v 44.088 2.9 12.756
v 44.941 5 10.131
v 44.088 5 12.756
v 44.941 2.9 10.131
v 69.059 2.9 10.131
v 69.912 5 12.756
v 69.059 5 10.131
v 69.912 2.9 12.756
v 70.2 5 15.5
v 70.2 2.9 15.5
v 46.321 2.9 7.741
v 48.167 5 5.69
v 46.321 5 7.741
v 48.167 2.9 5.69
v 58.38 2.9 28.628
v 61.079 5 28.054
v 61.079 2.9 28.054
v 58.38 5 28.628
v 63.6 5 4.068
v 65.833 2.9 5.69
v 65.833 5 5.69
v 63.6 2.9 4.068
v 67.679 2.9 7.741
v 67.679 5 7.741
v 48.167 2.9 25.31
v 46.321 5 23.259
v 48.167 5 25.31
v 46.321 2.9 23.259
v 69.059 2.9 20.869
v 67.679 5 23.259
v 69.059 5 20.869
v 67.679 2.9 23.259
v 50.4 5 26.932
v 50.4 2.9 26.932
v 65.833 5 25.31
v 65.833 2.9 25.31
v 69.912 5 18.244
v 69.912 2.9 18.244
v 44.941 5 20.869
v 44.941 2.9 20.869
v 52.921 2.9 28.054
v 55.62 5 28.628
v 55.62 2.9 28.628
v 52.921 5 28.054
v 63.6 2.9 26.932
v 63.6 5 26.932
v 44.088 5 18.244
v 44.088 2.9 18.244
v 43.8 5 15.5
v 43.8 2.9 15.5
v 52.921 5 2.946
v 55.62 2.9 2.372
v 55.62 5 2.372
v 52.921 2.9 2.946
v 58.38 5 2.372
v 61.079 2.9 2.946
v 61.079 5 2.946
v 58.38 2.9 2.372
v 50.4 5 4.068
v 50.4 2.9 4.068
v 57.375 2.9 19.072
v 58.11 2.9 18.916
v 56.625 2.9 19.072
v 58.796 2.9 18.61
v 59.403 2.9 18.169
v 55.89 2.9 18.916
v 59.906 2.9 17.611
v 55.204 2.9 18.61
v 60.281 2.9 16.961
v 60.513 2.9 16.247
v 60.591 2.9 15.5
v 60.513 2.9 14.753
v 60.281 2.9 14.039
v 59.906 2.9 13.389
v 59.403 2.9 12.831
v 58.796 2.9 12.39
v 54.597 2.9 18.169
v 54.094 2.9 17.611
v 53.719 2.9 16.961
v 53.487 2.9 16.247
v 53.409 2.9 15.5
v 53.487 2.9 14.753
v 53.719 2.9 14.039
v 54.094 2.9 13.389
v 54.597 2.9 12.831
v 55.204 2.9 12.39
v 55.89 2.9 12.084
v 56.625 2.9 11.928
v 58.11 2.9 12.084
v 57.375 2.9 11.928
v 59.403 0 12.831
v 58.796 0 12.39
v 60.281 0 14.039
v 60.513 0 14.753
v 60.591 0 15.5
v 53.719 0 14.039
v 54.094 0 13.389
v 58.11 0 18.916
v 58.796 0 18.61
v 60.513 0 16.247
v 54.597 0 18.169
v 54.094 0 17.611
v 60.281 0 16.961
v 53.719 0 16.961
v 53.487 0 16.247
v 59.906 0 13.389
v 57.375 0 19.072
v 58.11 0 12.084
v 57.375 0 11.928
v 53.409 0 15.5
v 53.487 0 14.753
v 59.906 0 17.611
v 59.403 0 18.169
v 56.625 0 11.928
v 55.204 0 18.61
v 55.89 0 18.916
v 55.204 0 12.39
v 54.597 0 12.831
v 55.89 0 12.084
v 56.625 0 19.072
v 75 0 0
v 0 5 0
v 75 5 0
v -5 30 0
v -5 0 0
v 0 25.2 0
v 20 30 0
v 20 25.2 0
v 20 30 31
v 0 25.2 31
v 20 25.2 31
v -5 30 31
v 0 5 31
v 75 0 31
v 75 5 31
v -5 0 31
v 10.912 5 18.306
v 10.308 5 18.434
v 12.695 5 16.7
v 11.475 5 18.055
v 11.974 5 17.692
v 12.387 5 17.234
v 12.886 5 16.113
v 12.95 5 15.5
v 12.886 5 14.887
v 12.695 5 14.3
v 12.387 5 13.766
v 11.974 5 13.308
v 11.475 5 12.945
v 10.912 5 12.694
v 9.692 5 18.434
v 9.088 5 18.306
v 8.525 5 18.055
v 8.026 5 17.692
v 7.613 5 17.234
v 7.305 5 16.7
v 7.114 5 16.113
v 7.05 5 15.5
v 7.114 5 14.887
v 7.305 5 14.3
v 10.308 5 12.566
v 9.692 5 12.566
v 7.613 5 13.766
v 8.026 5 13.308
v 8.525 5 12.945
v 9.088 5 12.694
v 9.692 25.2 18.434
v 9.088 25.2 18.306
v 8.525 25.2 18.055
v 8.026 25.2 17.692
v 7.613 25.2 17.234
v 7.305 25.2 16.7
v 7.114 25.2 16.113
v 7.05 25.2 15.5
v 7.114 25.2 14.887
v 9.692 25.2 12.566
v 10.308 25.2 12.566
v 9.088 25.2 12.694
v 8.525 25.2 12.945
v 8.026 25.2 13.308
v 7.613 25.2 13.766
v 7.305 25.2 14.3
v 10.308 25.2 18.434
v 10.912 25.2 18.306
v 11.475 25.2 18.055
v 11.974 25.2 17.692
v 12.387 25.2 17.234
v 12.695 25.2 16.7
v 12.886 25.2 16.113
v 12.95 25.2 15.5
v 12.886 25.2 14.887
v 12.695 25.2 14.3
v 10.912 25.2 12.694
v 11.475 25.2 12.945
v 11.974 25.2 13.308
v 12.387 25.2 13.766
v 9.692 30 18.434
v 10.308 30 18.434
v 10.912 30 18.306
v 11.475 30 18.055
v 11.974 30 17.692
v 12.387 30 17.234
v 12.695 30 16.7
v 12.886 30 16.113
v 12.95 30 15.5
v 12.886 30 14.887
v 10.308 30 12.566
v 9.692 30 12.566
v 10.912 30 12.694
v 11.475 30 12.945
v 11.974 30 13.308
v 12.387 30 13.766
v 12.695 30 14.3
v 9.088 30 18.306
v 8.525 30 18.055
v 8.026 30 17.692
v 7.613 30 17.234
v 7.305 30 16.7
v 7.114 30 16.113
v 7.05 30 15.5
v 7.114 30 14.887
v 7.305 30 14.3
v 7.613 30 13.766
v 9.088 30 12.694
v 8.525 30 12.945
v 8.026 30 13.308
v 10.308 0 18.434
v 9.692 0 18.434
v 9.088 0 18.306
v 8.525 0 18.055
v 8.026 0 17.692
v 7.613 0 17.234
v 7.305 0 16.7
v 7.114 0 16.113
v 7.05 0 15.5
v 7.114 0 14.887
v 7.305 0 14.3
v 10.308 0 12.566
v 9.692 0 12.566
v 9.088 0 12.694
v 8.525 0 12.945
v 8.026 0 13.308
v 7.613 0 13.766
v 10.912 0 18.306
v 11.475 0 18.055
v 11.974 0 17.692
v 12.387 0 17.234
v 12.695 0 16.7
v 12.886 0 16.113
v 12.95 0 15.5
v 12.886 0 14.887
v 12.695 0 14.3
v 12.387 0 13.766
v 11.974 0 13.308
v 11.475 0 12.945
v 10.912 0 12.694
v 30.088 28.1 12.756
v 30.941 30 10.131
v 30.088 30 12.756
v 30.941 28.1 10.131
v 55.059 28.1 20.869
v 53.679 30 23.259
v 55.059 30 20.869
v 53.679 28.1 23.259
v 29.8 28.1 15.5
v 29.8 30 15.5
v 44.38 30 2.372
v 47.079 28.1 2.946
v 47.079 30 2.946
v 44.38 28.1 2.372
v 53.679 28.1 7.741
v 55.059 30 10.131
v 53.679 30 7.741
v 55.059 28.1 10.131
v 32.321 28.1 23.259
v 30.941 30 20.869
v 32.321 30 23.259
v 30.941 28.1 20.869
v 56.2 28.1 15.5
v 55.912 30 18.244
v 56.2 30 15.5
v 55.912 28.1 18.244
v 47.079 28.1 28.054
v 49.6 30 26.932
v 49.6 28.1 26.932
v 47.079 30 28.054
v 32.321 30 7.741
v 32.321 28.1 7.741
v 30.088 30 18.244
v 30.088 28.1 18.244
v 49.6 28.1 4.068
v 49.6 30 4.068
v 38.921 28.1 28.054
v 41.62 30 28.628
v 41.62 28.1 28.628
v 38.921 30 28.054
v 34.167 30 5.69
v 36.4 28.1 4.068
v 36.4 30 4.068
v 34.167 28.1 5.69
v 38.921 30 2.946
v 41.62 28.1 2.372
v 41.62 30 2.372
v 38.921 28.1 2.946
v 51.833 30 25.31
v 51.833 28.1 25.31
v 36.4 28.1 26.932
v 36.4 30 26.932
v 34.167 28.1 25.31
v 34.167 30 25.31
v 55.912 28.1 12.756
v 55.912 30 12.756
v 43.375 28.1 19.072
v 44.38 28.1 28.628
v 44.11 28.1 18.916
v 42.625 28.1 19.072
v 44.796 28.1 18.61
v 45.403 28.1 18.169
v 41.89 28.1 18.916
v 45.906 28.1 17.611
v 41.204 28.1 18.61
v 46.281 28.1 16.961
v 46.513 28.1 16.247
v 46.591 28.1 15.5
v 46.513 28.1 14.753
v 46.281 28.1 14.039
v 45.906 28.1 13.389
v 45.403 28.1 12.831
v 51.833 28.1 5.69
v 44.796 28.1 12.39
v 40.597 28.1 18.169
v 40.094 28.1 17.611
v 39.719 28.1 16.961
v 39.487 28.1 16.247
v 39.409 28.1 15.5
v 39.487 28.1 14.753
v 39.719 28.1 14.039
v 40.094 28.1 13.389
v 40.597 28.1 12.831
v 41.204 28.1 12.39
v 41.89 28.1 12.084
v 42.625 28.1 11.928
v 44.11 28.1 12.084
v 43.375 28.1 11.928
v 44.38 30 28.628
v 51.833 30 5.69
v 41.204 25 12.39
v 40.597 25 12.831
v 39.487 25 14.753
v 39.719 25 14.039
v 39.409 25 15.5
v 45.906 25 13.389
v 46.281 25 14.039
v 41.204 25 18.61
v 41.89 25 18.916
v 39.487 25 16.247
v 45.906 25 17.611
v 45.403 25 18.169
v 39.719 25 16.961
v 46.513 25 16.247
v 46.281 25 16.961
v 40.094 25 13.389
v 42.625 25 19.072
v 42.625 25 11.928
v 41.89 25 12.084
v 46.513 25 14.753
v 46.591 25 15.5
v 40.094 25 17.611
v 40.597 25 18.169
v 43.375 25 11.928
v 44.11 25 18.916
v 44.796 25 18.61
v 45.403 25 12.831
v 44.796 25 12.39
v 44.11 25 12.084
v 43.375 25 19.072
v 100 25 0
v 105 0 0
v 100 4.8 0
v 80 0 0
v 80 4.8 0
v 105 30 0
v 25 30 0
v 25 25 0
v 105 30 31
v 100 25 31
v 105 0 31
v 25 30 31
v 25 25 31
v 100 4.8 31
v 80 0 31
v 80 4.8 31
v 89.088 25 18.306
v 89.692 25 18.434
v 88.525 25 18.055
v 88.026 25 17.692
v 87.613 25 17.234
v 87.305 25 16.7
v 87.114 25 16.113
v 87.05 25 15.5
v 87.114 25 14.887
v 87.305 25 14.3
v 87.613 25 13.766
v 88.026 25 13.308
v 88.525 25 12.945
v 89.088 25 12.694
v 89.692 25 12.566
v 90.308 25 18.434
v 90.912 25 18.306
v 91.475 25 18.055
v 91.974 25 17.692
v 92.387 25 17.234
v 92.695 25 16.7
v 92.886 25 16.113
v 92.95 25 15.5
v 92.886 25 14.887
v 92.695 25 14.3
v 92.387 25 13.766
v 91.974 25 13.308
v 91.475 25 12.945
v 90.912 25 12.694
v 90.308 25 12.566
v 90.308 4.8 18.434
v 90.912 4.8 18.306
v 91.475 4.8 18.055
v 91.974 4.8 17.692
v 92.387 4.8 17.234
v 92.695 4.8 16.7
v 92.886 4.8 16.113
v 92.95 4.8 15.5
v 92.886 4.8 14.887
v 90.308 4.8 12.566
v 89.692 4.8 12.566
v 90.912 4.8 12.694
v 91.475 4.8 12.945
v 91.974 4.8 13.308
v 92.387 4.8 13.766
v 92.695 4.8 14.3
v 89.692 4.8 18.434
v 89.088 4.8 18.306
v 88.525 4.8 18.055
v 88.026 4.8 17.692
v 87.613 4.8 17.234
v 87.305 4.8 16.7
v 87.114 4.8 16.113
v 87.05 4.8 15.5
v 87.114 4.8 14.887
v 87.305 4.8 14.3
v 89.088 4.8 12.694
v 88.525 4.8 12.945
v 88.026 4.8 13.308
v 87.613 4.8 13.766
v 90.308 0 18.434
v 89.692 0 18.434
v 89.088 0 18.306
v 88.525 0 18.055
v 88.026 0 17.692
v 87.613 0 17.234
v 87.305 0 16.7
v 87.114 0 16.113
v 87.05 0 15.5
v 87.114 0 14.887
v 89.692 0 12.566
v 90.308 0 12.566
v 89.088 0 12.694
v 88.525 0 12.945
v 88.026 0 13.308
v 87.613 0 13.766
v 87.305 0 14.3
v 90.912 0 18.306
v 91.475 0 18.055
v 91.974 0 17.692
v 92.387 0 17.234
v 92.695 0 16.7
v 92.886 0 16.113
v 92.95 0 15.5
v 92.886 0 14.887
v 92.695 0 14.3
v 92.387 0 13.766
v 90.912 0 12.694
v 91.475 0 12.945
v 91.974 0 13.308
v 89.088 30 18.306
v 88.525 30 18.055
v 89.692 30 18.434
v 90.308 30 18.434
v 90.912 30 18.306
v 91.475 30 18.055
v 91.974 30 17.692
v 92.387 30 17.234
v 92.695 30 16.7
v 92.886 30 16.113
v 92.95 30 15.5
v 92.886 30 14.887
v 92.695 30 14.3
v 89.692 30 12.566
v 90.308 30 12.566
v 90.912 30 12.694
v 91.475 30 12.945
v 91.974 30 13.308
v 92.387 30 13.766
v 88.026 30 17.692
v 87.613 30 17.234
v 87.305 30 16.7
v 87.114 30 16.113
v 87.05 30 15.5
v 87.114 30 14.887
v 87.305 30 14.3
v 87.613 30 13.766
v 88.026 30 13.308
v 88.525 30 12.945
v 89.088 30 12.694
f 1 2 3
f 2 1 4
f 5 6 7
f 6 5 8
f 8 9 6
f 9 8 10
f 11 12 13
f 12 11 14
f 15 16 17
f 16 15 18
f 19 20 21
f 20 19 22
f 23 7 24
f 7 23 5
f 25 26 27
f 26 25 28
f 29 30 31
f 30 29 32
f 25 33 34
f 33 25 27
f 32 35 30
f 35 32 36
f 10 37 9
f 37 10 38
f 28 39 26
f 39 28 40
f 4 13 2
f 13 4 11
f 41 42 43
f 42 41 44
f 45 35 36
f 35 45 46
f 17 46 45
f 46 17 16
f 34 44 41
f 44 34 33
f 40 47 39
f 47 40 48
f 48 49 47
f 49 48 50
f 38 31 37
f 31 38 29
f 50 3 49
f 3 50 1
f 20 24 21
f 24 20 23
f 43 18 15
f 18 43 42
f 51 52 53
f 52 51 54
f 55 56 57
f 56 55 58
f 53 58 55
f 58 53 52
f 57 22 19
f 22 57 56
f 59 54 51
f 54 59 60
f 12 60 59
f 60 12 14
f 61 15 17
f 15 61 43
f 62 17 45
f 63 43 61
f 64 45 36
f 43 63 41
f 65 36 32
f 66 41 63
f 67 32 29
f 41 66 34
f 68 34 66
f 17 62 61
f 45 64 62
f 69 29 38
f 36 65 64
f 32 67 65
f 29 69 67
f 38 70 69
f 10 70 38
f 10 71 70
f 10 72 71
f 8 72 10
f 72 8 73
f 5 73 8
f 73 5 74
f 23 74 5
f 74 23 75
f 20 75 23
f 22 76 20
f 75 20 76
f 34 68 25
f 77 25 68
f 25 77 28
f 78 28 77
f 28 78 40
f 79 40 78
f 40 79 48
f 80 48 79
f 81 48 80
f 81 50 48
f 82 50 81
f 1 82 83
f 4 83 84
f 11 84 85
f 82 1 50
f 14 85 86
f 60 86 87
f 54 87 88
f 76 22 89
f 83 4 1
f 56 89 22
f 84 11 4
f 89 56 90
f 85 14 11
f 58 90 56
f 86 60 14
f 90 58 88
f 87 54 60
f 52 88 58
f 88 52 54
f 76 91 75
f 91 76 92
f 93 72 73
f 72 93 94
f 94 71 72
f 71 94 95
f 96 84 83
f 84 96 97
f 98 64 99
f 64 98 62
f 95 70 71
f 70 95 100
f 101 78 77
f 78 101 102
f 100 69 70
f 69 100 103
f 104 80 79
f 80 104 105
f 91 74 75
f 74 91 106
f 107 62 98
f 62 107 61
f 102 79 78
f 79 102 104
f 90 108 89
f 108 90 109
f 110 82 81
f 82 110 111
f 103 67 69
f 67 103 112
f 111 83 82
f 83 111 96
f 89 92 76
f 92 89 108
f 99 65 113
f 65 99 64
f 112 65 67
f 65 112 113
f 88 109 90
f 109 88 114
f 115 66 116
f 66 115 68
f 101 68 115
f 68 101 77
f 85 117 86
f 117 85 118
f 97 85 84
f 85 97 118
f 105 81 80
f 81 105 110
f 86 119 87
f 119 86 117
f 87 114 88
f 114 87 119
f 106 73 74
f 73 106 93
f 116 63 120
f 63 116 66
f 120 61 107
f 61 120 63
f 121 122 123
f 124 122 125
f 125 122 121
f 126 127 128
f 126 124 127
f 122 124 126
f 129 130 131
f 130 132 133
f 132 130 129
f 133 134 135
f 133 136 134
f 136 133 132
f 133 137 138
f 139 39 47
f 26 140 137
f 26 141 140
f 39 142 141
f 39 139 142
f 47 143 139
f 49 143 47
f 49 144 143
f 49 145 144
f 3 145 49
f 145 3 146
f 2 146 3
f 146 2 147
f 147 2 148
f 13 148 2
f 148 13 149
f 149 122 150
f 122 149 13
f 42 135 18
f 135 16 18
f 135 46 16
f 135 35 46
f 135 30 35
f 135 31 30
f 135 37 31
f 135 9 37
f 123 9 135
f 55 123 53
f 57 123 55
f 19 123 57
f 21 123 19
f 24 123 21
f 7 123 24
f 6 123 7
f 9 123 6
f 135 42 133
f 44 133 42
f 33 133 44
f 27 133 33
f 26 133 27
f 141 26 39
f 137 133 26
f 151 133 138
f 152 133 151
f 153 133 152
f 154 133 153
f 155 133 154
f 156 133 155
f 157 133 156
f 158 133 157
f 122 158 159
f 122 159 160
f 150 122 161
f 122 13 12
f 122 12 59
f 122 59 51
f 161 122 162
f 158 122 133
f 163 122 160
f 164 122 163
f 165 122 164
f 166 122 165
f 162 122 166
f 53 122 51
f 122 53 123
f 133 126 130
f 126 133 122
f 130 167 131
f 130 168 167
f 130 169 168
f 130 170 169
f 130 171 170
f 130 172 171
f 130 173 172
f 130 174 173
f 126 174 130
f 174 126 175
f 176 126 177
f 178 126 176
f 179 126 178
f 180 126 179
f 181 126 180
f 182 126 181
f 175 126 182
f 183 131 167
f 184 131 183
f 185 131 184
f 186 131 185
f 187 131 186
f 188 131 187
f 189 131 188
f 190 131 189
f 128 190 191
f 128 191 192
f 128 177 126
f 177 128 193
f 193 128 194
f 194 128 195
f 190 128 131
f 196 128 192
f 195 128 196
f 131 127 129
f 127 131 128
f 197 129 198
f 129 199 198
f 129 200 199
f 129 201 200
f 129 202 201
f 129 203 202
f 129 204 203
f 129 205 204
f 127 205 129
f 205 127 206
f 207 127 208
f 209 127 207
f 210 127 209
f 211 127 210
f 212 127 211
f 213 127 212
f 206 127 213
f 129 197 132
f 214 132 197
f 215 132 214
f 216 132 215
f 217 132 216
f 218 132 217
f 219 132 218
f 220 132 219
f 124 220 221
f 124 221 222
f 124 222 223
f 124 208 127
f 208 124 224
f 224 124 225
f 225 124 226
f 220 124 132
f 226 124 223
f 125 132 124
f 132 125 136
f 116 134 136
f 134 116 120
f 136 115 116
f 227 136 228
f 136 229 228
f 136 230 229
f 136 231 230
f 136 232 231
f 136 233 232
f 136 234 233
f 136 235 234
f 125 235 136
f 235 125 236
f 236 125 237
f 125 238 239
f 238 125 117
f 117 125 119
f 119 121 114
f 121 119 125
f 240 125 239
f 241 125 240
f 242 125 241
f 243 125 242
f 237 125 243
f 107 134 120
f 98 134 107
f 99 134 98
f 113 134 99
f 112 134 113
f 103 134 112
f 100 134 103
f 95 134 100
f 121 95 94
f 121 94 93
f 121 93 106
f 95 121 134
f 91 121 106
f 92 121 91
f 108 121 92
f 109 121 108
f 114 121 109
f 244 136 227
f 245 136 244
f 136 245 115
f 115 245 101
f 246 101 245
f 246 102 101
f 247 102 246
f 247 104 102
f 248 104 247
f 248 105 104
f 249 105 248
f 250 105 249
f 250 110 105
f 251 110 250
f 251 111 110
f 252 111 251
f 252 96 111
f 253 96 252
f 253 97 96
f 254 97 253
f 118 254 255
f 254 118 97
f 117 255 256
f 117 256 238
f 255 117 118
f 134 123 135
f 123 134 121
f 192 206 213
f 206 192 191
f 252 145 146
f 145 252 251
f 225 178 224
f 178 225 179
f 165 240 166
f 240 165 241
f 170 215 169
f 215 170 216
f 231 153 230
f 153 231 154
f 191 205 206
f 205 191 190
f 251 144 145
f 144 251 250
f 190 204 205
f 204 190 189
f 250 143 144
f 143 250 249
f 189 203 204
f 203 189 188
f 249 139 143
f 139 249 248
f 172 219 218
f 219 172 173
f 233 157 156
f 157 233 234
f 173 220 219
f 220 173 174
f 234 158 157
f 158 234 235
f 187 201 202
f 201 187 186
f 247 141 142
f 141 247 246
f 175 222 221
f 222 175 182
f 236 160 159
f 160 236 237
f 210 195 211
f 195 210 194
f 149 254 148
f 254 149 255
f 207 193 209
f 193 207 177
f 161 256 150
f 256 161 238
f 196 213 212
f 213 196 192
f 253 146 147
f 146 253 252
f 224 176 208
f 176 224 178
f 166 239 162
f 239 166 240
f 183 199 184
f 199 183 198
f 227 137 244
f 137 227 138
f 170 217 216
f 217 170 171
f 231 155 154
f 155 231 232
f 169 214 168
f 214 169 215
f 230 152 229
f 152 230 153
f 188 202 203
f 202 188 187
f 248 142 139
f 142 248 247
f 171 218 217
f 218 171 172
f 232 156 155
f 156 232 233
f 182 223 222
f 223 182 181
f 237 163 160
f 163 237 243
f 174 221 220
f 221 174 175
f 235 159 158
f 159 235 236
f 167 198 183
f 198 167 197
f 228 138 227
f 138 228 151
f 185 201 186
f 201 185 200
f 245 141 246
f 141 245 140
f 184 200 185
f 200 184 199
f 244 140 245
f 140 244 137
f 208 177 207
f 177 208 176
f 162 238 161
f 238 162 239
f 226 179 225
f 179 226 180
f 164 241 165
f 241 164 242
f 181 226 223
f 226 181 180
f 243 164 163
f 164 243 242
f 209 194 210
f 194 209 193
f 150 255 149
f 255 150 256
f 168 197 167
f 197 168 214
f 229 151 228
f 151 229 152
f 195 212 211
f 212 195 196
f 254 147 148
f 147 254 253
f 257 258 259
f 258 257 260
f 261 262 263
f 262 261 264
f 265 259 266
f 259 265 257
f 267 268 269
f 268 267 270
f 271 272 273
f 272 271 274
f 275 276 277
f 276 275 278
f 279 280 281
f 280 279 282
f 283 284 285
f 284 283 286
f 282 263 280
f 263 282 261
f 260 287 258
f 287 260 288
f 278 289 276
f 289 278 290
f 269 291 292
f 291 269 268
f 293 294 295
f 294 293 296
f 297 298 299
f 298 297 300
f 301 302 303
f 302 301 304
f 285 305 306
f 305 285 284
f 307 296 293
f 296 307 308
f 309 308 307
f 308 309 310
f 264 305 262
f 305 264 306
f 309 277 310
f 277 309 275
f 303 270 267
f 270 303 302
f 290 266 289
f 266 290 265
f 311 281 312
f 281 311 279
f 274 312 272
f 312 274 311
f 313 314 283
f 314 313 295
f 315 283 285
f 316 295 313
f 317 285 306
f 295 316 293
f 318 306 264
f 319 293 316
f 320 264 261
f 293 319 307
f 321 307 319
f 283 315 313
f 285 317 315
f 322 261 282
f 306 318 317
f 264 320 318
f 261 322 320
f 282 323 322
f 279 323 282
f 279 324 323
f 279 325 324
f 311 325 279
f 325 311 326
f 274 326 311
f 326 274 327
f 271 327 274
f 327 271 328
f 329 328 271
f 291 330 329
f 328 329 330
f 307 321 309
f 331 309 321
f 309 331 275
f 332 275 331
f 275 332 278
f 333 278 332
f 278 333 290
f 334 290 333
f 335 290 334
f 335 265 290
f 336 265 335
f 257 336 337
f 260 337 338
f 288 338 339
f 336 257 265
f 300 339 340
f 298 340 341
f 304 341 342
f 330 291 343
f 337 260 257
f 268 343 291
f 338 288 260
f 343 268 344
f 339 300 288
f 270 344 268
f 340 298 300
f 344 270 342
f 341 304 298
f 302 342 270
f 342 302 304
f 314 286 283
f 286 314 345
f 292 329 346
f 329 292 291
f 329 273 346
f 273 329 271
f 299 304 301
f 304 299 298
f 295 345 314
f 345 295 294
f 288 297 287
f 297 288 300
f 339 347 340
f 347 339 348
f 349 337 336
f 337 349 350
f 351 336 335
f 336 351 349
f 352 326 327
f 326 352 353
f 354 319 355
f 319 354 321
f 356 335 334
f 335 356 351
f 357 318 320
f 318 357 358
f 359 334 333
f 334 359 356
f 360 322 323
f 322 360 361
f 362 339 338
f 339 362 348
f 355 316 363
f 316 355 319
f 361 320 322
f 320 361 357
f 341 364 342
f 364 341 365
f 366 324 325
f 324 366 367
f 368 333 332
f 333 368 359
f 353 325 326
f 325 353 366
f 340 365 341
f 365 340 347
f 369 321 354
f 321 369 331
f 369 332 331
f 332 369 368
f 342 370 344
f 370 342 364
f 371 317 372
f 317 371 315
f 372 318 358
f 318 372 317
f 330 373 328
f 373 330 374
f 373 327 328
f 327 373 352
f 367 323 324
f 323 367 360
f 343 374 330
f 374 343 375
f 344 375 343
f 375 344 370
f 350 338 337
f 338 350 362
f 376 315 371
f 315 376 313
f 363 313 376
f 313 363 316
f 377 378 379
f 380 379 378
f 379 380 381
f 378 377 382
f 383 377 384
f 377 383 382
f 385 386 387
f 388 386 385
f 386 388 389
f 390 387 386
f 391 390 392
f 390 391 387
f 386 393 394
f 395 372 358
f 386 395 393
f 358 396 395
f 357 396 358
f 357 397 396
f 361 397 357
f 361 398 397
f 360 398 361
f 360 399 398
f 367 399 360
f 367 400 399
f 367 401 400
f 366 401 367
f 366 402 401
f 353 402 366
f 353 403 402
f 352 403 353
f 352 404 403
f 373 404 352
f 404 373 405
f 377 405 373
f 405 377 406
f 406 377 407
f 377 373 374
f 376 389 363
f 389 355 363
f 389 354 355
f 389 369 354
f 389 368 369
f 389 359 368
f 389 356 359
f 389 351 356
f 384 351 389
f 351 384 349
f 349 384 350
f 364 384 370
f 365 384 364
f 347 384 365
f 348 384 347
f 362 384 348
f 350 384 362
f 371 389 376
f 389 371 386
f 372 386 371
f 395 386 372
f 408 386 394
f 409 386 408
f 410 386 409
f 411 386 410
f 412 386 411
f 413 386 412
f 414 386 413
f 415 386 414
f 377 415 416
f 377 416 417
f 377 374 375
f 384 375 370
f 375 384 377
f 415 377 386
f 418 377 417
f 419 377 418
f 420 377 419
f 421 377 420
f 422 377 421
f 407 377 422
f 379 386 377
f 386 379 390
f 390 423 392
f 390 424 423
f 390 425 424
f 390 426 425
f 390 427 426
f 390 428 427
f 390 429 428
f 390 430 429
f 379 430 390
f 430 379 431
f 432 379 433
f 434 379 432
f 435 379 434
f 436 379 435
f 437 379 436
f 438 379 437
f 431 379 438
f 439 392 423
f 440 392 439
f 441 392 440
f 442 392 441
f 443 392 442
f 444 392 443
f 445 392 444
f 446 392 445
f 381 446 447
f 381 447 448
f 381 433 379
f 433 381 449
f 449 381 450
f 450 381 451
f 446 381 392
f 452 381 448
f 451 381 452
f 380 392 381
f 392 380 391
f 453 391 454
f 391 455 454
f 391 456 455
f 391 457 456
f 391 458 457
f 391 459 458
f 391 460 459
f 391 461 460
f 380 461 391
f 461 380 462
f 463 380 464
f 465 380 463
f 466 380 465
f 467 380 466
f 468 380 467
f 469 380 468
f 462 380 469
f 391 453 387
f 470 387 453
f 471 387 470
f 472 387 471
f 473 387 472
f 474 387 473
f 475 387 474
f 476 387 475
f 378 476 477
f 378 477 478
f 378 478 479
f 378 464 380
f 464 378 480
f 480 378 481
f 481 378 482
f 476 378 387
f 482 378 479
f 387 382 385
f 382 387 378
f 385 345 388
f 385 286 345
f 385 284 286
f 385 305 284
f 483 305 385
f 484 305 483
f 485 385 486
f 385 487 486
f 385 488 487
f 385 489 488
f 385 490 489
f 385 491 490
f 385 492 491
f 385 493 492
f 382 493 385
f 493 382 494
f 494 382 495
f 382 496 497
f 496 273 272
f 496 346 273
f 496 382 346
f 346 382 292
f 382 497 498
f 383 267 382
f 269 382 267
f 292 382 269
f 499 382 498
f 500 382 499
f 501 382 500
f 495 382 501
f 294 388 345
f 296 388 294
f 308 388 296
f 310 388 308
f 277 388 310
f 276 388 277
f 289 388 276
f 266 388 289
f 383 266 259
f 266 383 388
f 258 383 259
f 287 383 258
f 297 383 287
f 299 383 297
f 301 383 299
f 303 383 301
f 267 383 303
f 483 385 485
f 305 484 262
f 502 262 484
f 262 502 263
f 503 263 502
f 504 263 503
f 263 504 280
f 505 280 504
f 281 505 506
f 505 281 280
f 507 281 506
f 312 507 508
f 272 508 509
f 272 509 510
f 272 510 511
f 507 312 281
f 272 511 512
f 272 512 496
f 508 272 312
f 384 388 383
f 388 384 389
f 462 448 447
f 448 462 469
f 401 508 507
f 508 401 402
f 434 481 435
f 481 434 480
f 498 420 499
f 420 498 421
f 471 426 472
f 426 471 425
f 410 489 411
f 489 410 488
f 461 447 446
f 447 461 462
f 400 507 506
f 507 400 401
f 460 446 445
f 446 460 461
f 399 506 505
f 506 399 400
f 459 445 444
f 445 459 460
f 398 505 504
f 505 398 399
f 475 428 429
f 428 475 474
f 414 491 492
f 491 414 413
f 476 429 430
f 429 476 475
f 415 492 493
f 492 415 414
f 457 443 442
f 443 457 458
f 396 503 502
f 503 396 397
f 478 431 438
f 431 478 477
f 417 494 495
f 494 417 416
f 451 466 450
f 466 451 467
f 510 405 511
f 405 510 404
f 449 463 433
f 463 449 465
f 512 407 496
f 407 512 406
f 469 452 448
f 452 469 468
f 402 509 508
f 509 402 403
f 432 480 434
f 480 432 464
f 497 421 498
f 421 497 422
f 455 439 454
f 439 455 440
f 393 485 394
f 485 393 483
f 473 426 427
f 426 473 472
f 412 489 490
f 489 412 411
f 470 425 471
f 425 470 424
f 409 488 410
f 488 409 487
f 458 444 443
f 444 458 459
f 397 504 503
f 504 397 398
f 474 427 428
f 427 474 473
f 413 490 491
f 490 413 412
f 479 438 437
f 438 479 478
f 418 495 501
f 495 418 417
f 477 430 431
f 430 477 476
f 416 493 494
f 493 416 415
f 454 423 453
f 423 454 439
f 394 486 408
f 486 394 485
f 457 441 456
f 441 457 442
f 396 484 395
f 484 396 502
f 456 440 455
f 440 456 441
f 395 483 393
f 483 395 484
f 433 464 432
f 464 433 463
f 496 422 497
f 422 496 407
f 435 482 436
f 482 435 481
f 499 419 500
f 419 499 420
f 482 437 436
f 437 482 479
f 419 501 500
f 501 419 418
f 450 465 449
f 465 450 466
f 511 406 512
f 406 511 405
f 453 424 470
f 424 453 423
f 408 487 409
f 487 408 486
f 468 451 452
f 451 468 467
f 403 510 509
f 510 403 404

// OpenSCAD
// Bracket to connect A/V equipment (like a light) to 2020 extrusion
// Adrian McCarthy 21-09-2023

function thou(x) = 25.5 * x/1000;

module av_bracket(washer_inside=true, nozzle_d=0.4) {
    th = 5;
    extrusion_size = 20;
    washer_d = 26;
    washer_recess = 2;
    washer_z = washer_inside ? th-washer_recess : washer_recess-th;
    reach = 50;
    bracket_l = th + reach + extrusion_size + th;
    bracket_w = th + extrusion_size + th;
    bracket_h = max(extrusion_size, washer_d) + th;
    $fs = nozzle_d/2;

    translate([0, 0, bracket_h/2]) rotate([-90, 0, 0]) {
        difference() {
            translate([0, 0, th]) rotate([90, 0, 0]) {
                linear_extrude(bracket_h, convexity=10, center=true) {
                    translate([-th, -th]) {
                        square([bracket_l, th]);
                        square([th, bracket_w]);
                    }
                    translate([-th, extrusion_size+nozzle_d/2]) {
                        square([th + extrusion_size, th - nozzle_d/2]);
                    }
                }
            }
            
            translate([extrusion_size + reach - washer_d/2, 0, -0.1]) {
                translate([0, 0, washer_z]) {
                    linear_extrude(th) {
                        circle(d=washer_d+nozzle_d);
                    }
                }
                translate([0, 0, -1]) linear_extrude(th+2) {
                    circle(d=thou(266)+nozzle_d);
                }
            }
            translate([extrusion_size/2, 0, -0.1]) {
                linear_extrude(bracket_w+2) {
                    circle(d=5.5+nozzle_d);
                }
            }
        }
    }
}

av_bracket(washer_inside=true);
translate([100, 30, 0]) rotate([0, 0, 180]) av_bracket(washer_inside=false);
